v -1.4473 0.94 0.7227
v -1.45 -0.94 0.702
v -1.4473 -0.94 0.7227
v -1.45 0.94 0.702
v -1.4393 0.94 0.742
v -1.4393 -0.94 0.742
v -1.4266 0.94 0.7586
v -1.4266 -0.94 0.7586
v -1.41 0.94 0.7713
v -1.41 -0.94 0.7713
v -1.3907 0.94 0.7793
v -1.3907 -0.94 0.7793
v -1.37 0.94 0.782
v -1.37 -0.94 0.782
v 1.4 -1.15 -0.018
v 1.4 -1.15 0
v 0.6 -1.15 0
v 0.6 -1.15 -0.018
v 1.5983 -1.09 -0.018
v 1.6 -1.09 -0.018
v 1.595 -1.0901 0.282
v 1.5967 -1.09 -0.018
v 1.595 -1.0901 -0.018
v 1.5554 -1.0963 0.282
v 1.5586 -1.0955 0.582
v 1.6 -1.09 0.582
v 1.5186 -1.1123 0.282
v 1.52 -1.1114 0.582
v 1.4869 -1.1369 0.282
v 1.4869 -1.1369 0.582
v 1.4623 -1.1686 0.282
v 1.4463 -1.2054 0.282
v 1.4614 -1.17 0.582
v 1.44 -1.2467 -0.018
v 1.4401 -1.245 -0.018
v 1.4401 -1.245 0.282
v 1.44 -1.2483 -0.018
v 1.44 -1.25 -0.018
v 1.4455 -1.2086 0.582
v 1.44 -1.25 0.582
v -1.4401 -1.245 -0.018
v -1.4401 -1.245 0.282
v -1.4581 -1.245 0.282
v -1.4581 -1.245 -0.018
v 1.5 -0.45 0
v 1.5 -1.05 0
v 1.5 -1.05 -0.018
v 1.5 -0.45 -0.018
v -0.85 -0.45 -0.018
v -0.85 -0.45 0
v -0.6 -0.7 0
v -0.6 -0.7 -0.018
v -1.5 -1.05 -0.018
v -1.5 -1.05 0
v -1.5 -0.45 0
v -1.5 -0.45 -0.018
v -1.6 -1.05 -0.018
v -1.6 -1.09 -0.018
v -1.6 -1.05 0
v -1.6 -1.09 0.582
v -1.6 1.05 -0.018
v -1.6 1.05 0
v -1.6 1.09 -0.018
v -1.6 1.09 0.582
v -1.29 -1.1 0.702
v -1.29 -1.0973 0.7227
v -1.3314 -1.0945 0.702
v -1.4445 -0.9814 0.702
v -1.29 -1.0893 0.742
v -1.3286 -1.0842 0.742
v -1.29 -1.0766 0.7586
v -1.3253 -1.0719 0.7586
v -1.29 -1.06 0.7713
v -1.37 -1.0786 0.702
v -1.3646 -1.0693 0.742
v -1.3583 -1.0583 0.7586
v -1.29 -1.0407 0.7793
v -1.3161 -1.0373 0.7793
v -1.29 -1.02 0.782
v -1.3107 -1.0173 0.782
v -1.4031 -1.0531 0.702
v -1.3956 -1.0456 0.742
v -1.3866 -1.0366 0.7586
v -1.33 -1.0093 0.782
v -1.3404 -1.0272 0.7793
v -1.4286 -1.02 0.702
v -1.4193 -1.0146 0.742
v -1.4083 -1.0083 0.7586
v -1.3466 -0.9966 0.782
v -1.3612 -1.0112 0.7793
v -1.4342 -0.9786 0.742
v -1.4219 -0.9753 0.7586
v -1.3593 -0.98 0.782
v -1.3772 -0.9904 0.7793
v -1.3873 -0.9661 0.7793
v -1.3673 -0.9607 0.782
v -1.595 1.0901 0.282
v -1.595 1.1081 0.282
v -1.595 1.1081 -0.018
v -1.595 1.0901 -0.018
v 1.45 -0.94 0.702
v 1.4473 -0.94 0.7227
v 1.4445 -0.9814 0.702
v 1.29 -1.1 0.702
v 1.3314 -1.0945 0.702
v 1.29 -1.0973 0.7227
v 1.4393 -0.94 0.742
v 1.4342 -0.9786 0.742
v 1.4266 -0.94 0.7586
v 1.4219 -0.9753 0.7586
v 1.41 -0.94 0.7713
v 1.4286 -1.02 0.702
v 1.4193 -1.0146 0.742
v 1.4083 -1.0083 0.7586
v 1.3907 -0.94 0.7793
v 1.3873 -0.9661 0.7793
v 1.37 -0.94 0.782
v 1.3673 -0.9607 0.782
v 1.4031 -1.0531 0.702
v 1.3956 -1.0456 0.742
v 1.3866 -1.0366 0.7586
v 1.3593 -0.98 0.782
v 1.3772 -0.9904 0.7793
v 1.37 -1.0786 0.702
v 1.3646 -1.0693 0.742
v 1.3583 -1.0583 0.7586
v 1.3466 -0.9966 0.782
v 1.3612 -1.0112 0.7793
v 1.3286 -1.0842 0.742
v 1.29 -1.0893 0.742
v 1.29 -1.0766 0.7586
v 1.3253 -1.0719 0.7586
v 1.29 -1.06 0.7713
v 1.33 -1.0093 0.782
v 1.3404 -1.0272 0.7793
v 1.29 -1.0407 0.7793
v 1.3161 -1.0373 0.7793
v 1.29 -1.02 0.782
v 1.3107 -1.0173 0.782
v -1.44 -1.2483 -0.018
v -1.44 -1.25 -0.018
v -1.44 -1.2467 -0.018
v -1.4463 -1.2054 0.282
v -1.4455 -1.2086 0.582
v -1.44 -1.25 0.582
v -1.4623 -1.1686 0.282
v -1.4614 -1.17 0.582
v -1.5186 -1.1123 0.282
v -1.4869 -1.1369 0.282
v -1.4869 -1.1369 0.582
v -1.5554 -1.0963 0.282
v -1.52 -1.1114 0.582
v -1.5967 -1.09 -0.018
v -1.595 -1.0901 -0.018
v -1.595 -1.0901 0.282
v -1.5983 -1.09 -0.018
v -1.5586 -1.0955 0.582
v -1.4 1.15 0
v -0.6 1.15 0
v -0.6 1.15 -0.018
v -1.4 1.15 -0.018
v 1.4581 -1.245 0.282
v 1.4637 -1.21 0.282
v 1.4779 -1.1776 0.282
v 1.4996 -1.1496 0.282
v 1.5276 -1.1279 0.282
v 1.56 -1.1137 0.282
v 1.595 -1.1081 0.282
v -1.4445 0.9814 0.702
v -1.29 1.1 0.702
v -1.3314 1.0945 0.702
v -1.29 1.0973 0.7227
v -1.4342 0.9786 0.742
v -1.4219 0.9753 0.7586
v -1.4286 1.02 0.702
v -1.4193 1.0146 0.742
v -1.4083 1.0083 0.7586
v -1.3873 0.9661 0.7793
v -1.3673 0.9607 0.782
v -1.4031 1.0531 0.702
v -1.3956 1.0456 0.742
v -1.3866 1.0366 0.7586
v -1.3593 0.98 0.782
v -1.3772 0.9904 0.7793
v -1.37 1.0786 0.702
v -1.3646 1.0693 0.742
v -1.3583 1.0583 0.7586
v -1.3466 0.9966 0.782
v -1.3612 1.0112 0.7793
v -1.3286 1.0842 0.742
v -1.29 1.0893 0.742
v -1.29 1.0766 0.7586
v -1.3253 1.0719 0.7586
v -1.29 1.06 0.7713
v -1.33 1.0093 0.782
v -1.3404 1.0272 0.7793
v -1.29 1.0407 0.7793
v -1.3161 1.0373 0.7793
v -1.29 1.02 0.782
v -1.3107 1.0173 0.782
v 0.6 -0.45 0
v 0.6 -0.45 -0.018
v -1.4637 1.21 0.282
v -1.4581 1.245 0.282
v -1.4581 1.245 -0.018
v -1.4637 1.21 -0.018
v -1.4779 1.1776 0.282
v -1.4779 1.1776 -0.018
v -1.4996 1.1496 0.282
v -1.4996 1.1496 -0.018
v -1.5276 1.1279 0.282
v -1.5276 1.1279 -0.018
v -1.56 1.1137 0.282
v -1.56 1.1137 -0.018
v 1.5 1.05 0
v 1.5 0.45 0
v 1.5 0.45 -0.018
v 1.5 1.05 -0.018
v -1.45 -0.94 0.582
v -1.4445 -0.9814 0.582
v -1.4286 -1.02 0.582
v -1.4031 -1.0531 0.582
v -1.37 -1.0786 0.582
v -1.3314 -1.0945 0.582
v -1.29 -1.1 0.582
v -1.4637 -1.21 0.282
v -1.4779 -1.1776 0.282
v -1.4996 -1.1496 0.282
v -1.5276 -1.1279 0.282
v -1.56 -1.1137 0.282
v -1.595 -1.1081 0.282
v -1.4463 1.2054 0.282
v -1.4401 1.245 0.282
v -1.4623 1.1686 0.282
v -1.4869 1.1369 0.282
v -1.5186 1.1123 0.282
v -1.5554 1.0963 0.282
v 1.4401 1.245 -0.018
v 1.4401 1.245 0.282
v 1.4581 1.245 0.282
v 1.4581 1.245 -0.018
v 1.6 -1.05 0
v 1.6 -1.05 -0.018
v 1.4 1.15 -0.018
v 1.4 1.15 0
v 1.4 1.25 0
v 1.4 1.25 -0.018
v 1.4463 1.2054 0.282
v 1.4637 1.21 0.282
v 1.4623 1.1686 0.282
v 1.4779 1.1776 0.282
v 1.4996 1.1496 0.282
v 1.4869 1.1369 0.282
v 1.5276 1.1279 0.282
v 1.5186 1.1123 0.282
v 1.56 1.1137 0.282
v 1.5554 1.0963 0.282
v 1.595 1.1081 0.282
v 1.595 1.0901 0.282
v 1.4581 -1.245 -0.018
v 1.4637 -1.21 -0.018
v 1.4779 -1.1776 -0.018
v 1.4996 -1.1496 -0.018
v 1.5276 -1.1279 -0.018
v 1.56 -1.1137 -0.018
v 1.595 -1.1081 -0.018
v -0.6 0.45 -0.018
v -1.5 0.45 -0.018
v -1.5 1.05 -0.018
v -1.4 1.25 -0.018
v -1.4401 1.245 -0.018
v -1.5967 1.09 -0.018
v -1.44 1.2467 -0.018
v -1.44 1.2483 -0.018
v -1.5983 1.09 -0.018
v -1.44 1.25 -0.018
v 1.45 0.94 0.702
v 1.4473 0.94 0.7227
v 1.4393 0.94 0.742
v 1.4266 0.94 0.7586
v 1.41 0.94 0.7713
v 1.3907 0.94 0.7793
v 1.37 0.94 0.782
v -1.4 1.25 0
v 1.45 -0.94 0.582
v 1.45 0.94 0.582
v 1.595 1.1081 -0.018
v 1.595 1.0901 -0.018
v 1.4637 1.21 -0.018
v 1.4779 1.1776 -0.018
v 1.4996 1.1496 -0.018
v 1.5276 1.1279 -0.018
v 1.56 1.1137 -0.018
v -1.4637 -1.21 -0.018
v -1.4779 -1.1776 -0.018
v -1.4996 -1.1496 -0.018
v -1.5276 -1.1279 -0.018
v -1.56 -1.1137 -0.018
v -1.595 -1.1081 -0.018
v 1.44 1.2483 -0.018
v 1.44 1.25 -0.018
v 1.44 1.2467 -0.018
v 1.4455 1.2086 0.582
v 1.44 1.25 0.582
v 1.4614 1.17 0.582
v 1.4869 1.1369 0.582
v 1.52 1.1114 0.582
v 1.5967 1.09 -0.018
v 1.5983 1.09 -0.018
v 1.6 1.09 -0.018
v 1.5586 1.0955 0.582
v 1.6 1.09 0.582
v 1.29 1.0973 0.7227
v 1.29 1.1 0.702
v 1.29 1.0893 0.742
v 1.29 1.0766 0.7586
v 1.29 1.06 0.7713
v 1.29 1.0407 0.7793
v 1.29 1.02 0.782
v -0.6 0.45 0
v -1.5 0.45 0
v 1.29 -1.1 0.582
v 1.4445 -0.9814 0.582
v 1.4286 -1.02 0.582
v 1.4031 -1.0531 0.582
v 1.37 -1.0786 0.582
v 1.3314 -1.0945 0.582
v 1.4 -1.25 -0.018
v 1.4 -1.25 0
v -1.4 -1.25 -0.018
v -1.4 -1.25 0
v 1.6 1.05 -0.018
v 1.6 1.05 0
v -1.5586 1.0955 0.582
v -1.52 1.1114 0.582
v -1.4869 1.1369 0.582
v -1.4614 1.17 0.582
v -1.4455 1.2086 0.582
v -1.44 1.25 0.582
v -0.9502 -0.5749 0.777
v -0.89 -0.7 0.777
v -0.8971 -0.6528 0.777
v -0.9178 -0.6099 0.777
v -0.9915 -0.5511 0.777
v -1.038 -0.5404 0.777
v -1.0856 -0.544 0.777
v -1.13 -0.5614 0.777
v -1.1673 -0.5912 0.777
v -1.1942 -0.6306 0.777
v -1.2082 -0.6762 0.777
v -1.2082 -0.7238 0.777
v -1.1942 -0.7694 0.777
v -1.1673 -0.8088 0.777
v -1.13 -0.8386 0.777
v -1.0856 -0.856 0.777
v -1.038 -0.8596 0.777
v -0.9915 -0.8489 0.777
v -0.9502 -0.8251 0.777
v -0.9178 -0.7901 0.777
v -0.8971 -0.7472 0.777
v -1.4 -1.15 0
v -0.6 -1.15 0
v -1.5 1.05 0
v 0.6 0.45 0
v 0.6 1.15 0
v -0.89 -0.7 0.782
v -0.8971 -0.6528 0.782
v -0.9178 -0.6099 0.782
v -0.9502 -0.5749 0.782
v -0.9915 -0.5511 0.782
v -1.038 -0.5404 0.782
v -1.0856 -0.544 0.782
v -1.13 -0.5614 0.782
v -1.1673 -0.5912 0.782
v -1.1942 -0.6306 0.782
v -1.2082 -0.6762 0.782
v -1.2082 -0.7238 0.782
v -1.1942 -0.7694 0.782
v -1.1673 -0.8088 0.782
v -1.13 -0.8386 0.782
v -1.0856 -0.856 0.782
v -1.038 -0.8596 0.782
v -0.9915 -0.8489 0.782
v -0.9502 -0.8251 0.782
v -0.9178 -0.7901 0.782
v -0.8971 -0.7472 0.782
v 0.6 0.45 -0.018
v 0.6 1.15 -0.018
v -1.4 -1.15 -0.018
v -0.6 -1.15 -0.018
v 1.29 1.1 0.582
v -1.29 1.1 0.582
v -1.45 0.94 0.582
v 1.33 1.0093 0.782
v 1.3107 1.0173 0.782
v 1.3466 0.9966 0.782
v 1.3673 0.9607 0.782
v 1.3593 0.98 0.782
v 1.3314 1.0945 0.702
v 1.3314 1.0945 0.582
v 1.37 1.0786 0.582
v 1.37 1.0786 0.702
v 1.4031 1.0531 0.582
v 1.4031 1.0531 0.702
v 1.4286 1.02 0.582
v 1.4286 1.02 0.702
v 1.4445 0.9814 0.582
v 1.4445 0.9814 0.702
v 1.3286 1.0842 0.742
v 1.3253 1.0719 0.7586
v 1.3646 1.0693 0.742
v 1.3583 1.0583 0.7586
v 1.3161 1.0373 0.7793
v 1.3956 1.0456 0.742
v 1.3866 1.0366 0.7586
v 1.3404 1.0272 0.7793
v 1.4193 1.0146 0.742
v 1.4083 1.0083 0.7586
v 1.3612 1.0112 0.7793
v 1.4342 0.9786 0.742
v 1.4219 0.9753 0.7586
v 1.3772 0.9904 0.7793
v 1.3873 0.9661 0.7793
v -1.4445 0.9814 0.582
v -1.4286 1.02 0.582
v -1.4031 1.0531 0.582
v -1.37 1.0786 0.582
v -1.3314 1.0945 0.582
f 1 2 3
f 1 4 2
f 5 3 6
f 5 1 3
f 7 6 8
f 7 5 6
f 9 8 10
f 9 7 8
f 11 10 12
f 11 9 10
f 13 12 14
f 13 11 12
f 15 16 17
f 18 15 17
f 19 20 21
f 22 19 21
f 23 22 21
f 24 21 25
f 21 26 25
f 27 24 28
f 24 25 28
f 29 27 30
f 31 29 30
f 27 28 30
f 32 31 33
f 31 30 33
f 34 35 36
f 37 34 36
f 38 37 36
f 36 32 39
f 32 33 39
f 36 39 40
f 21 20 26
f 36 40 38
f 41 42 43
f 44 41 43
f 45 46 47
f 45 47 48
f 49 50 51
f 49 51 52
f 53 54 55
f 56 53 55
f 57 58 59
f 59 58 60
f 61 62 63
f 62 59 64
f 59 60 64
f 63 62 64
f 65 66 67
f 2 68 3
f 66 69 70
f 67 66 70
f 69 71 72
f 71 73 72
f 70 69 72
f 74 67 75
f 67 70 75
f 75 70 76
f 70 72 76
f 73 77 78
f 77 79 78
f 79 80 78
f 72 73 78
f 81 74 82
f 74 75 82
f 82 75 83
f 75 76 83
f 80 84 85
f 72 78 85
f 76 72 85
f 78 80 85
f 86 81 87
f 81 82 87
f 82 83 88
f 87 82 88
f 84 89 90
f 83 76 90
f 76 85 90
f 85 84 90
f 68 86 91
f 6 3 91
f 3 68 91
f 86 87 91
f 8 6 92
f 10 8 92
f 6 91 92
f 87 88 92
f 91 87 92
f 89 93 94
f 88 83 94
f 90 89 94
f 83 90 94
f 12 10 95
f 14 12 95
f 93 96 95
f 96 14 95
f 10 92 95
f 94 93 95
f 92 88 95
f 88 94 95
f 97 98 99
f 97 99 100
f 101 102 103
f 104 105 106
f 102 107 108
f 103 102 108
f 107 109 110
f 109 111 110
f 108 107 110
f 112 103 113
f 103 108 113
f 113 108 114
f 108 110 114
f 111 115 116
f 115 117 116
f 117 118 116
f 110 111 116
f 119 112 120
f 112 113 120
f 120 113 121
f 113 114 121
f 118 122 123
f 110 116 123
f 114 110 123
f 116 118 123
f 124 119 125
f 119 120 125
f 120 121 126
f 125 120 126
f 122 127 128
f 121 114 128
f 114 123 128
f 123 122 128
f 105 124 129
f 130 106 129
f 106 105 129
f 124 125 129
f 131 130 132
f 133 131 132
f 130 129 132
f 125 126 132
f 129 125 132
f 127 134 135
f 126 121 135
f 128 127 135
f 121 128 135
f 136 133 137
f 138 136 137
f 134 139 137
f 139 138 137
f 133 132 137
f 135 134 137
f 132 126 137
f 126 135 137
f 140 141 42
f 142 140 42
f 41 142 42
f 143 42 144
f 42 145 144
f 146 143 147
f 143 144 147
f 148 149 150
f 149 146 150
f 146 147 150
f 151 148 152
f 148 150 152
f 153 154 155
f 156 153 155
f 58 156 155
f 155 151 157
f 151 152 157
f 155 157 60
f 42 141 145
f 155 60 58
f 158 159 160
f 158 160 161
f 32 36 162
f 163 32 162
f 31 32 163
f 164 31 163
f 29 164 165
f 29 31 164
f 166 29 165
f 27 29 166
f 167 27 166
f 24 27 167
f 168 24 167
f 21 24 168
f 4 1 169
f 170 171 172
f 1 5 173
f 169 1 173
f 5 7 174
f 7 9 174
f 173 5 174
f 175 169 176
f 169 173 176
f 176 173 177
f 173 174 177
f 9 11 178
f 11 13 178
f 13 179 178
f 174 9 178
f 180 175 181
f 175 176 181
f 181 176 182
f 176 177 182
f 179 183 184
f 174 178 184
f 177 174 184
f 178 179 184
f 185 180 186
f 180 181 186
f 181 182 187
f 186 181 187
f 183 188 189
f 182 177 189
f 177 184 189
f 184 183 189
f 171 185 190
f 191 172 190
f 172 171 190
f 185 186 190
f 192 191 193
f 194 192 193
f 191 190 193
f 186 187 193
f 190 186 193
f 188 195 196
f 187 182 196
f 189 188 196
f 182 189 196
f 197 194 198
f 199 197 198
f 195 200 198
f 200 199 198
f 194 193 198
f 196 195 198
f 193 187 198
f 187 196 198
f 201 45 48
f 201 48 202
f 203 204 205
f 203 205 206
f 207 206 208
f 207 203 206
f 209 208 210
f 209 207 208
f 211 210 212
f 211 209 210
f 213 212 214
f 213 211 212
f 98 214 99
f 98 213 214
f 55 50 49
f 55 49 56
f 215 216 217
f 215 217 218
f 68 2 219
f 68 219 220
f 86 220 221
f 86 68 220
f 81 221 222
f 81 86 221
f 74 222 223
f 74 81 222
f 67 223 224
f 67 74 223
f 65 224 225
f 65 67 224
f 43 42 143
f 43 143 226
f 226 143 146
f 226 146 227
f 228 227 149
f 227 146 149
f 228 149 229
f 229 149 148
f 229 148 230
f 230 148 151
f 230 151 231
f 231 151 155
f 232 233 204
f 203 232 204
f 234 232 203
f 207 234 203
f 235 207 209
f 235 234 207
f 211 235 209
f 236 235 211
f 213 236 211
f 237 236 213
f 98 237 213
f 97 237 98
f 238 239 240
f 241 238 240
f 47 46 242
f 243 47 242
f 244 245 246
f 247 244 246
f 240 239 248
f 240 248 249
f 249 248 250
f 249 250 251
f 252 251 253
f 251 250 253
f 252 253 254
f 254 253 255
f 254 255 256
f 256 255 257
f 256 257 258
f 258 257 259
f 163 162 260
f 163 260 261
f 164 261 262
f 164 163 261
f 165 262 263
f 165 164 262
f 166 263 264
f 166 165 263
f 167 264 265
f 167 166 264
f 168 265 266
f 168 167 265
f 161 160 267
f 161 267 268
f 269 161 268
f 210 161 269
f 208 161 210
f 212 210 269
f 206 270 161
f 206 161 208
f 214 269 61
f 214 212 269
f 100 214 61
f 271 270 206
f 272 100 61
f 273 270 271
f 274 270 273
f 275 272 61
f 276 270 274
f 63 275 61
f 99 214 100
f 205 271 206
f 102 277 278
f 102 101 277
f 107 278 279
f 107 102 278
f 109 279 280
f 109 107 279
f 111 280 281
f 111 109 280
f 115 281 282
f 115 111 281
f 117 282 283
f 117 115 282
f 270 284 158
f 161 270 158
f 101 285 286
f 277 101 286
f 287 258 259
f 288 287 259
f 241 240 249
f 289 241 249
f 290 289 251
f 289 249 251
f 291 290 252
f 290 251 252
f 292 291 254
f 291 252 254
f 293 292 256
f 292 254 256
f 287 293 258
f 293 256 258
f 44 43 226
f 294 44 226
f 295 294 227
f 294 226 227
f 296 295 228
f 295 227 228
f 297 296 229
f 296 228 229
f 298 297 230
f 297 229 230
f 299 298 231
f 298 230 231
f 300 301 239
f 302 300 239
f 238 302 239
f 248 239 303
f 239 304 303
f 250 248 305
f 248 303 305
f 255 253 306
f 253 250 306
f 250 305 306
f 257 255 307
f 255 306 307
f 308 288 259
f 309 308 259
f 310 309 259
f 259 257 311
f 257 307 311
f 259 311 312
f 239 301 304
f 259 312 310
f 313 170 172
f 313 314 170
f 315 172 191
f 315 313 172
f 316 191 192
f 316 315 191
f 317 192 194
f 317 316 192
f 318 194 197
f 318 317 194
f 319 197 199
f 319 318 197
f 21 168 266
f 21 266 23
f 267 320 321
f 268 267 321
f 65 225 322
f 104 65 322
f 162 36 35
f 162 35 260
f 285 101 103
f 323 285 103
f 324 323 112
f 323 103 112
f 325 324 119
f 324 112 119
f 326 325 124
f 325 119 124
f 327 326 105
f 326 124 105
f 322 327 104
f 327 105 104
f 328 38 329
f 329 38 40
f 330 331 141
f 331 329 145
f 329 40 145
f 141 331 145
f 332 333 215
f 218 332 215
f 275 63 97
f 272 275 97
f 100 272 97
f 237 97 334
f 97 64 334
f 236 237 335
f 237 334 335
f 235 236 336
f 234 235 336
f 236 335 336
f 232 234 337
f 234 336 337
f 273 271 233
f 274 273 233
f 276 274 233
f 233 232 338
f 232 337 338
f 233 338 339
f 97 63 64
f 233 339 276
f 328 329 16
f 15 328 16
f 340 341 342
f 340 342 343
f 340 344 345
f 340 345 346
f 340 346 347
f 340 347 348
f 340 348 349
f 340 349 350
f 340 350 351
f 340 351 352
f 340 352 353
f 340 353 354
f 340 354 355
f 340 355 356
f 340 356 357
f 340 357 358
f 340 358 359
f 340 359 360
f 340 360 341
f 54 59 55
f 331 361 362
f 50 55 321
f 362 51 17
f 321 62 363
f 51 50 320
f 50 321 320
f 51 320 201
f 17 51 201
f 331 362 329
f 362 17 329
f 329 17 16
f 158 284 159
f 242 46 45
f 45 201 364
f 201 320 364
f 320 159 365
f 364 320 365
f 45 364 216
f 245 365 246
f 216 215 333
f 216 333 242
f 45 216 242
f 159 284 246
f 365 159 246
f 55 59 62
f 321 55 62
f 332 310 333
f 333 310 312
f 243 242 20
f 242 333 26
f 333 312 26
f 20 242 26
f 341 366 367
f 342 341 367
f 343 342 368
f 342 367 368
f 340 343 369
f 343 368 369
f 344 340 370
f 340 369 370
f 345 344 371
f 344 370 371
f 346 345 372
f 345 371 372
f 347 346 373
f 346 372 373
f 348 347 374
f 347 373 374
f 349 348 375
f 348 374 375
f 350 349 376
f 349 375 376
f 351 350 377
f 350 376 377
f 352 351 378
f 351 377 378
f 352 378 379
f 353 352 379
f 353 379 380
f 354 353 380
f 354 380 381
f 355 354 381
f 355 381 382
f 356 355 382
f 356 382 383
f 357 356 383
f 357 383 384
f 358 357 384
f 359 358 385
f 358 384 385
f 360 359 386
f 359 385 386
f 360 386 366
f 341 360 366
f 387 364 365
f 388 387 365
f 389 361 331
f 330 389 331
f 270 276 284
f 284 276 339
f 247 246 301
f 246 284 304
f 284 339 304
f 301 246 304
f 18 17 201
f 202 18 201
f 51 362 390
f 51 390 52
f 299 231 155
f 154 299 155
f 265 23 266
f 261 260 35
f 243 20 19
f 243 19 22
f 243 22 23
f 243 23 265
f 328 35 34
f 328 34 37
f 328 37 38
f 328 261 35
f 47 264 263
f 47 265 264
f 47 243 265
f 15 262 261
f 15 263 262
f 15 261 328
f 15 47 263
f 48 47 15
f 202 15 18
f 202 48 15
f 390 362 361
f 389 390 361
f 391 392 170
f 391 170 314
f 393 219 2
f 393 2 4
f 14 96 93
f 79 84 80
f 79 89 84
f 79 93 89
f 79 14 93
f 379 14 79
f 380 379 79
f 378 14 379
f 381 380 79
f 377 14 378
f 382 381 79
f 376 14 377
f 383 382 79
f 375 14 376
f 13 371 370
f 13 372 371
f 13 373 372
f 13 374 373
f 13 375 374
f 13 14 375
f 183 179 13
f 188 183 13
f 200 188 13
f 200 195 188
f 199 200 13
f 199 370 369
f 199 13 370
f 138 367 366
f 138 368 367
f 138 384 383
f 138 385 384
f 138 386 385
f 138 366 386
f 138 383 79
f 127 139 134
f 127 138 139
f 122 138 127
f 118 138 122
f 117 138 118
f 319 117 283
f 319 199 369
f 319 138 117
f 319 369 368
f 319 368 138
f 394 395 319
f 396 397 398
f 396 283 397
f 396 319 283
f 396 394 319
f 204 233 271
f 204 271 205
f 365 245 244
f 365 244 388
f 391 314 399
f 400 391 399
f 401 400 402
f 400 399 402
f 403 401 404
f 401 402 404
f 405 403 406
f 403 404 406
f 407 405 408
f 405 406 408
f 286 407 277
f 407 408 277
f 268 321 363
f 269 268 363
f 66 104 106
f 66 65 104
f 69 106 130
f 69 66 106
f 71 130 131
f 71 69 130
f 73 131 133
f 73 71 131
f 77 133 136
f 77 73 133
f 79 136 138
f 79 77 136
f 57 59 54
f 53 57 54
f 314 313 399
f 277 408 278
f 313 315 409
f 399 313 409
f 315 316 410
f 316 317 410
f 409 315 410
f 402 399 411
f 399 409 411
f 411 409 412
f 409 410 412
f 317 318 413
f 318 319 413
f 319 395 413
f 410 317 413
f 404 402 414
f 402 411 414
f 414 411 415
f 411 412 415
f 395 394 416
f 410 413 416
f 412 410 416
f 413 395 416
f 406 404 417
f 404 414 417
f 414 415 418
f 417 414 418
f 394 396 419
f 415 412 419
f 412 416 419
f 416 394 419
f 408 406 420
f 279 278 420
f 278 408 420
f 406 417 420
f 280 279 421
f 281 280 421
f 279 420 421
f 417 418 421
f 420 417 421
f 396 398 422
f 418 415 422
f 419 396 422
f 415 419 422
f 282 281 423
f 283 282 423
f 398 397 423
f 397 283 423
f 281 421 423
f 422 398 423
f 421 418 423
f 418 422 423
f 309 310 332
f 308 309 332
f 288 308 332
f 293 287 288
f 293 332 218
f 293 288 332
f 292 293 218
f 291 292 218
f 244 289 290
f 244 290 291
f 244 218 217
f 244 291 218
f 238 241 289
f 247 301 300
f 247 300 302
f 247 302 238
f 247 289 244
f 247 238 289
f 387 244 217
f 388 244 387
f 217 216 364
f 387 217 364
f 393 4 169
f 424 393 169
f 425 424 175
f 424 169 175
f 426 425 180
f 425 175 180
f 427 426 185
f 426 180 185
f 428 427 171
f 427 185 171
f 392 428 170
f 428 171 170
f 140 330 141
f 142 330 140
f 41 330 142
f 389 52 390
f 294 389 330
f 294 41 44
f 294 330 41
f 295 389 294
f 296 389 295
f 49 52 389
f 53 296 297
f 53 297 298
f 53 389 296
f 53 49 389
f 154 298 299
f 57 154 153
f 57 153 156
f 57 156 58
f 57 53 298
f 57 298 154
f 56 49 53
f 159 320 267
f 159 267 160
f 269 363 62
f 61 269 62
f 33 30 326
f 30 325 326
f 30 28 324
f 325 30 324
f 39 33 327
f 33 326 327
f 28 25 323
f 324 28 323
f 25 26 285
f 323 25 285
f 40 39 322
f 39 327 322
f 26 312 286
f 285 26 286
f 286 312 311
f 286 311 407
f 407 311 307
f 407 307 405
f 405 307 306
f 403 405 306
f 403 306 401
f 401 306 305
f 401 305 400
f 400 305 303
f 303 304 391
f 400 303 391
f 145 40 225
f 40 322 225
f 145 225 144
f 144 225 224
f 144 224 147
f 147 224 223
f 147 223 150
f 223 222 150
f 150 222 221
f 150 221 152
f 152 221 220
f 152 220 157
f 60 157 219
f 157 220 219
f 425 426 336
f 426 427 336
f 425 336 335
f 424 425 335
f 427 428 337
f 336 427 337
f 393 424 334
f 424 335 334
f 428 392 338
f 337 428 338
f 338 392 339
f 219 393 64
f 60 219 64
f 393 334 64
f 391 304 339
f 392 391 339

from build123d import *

# Parameters (mm, degrees)
SKETCH1_W               = 3.2
SKETCH1_H               = 2.5
BOSS_EXTRUDE1_DEPTH     = 0.564
SKETCH2_W               = 0.9
SKETCH2_H               = 0.7
BOSS_EXTRUDE2_DEPTH     = 0.018
CHAMFER2_SIZE           = 0.25
CUT_EXTRUDE1_DEPTH      = 3.10727217
CUT_EXTRUDE1_DEPTH_BACK = 3.10727217
BOSS_EXTRUDE3_START     = -0.282
BOSS_EXTRUDE3_DEPTH     = 0.3
MIRROR2_START           = -0.282
MIRROR2_COPY_1_DEPTH    = 0.3
BOSS_EXTRUDE4_START     = 0.018
BOSS_EXTRUDE4_DEPTH     = 0.018
SKETCH8_W               = 2.9
SKETCH8_H               = 2.2
BOSS_EXTRUDE5_DEPTH     = 0.2
FILLET1_R               = 0.16
FILLET2_R               = 0.08
SKETCH9_R               = 0.16
CUT_EXTRUDE2_DEPTH      = 0.005


with BuildPart() as part:
    # Sketch1 → Boss-Extrude1 (new body)
    with BuildSketch(Plane.XY):
        Rectangle(SKETCH1_W, SKETCH1_H)
    extrude(amount=BOSS_EXTRUDE1_DEPTH)

    # Sketch2 → Boss-Extrude2 (add)
    with BuildSketch(Plane(origin=(0, 0, 0), x_dir=(-1, 0, 0), z_dir=(0, 0, -1))):
        with Locations((1.05, -0.8)):
            Rectangle(SKETCH2_W, SKETCH2_H)
        Polygon((1.5, -1.05), (1.5, -1.15), (1.4, -1.15), (1.4, -1.25), (1.6, -1.25), (1.6, -1.05), align=None)
        with Locations((-1.05, -0.8)):
            Rectangle(SKETCH2_W, SKETCH2_H)
        Polygon((-1.6, -1.25), (-1.4, -1.25), (-1.4, -1.15), (-1.5, -1.15), (-1.5, -1.05), (-1.6, -1.05), align=None)
        Polygon((-1.6, 1.25), (-1.6, 1.05), (-1.5, 1.05), (-1.5, 1.15), (-1.4, 1.15), (-1.4, 1.25), align=None)
        with Locations((-1.05, 0.8)):
            Rectangle(SKETCH2_W, SKETCH2_H)
        with Locations((1.05, 0.8)):
            Rectangle(SKETCH2_W, SKETCH2_H)
        Polygon((1.5, 1.05), (1.6, 1.05), (1.6, 1.25), (1.4, 1.25), (1.4, 1.15), (1.5, 1.15), align=None)
    extrude(amount=BOSS_EXTRUDE2_DEPTH)

    # Chamfer2
    chamfer2_edges = [part.edges().sort_by_distance(p)[0] for p in [
        (-0.6, -0.45, -0.009),
    ]]
    chamfer(chamfer2_edges, length=CHAMFER2_SIZE)

    # Sketch3 → Cut-Extrude1 (cut, two sides: drawn at the far end of the back side and taken through both)
    with BuildSketch(Plane(origin=(0, 0, 0), x_dir=(-1, 0, 0), z_dir=(0, 0, -1)).offset(-CUT_EXTRUDE1_DEPTH_BACK)):
        with BuildLine():
            Line((1.6, 1.09), (1.6, 1.25))
            Line((1.6, 1.25), (1.44, 1.25))
            ThreePointArc((1.44, 1.25), (1.486862915, 1.136862915), (1.6, 1.09))
        make_face()
        with BuildLine():
            Line((-1.44, 1.25), (-1.6, 1.25))
            Line((-1.6, 1.25), (-1.6, 1.09))
            ThreePointArc((-1.6, 1.09), (-1.486862915, 1.136862915), (-1.44, 1.25))
        make_face()
        with BuildLine():
            Line((-1.6, -1.09), (-1.6, -1.25))
            Line((-1.6, -1.25), (-1.44, -1.25))
            ThreePointArc((-1.44, -1.25), (-1.486862915, -1.136862915), (-1.6, -1.09))
        make_face()
        with BuildLine():
            Line((1.6, -1.09), (1.6, -1.25))
            Line((1.6, -1.25), (1.44, -1.25))
            ThreePointArc((1.44, -1.25), (1.486862915, -1.136862915), (1.6, -1.09))
        make_face()
    extrude(amount=CUT_EXTRUDE1_DEPTH + CUT_EXTRUDE1_DEPTH_BACK, mode=Mode.SUBTRACT)

    # Sketch5 → Boss-Extrude3 (add)
    with BuildSketch(Plane(origin=(0, 0, 0), x_dir=(-1, 0, 0), z_dir=(0, 0, -1)).offset(BOSS_EXTRUDE3_START)):
        with BuildLine():
            Line((1.440078144, -1.245), (1.458088055, -1.245))
            ThreePointArc((1.458088055, -1.245), (1.499590837, -1.149590837), (1.595, -1.108088055))
            Line((1.595, -1.108088055), (1.595, -1.090078144))
            ThreePointArc((1.595, -1.090078144), (1.486862915, -1.136862915), (1.440078144, -1.245))
        make_face()
    boss_extrude3 = extrude(amount=BOSS_EXTRUDE3_DEPTH)

    # Mirror1: Boss-Extrude3 across plane
    add(boss_extrude3.mirror(Plane(origin=(0, 0, 0), x_dir=(0, 0, 1), z_dir=(1, 0, 0))))

    # Mirror2: Boss-Extrude3 across plane
    add(boss_extrude3.mirror(Plane.ZX))

    # Mirror2 copy 1 sketch → Mirror2 copy 1 (add)
    with BuildSketch(Plane(origin=(0, 0, 0), x_dir=(1, 0, 0), z_dir=(0, 0, -1)).offset(MIRROR2_START)):
        with BuildLine():
            Line((1.440078144, -1.245), (1.458088055, -1.245))
            ThreePointArc((1.458088055, -1.245), (1.499590837, -1.149590837), (1.595, -1.108088055))
            Line((1.595, -1.108088055), (1.595, -1.090078144))
            ThreePointArc((1.595, -1.090078144), (1.486862915, -1.136862915), (1.440078144, -1.245))
        make_face()
    extrude(amount=MIRROR2_COPY_1_DEPTH)

    # Sketch7 → Boss-Extrude4 (add)
    with BuildSketch(Plane.XY.offset(0.564).offset(BOSS_EXTRUDE4_START)):
        with BuildLine():
            Line((-1.44, 1.25), (1.44, 1.25))
            ThreePointArc((1.44, 1.25), (1.486862915, 1.136862915), (1.6, 1.09))
            Line((1.6, 1.09), (1.6, -1.09))
            ThreePointArc((1.6, -1.09), (1.486862915, -1.136862915), (1.44, -1.25))
            Line((1.44, -1.25), (-1.44, -1.25))
            ThreePointArc((-1.44, -1.25), (-1.486862915, -1.136862915), (-1.6, -1.09))
            Line((-1.6, -1.09), (-1.6, 1.09))
            ThreePointArc((-1.6, 1.09), (-1.486862915, 1.136862915), (-1.44, 1.25))
        make_face()
    extrude(amount=-BOSS_EXTRUDE4_DEPTH)

    # Sketch8 → Boss-Extrude5 (add)
    with BuildSketch(Plane.XY.offset(0.582)):
        Rectangle(SKETCH8_W, SKETCH8_H)
    extrude(amount=BOSS_EXTRUDE5_DEPTH)

    # Fillet1
    fillet1_edges = [part.edges().sort_by_distance(p)[0] for p in [
        (1.45, -1.1, 0.682),
        (1.45, 1.1, 0.682),
        (-1.45, 1.1, 0.682),
        (-1.45, -1.1, 0.682),
    ]]
    fillet(fillet1_edges, radius=FILLET1_R)

    # Fillet2
    fillet2_edges = [part.edges().sort_by_distance(p)[0] for p in [
        (-1.45, 0, 0.782),
        (0, 1.1, 0.782),
        (1.45, 0, 0.782),
        (0, -1.1, 0.782),
        (-1.403137085, -1.053137085, 0.782),
        (1.403137085, -1.053137085, 0.782),
        (1.403137085, 1.053137085, 0.782),
        (-1.403137085, 1.053137085, 0.782),
    ]]
    fillet(fillet2_edges, radius=FILLET2_R)

    # Sketch9 → Cut-Extrude2 (cut)
    with BuildSketch(Plane.XY.offset(0.782)):
        with Locations((-1.05, -0.7)):
            Circle(SKETCH9_R)
    extrude(amount=-CUT_EXTRUDE2_DEPTH, mode=Mode.SUBTRACT)


solid = part.part
